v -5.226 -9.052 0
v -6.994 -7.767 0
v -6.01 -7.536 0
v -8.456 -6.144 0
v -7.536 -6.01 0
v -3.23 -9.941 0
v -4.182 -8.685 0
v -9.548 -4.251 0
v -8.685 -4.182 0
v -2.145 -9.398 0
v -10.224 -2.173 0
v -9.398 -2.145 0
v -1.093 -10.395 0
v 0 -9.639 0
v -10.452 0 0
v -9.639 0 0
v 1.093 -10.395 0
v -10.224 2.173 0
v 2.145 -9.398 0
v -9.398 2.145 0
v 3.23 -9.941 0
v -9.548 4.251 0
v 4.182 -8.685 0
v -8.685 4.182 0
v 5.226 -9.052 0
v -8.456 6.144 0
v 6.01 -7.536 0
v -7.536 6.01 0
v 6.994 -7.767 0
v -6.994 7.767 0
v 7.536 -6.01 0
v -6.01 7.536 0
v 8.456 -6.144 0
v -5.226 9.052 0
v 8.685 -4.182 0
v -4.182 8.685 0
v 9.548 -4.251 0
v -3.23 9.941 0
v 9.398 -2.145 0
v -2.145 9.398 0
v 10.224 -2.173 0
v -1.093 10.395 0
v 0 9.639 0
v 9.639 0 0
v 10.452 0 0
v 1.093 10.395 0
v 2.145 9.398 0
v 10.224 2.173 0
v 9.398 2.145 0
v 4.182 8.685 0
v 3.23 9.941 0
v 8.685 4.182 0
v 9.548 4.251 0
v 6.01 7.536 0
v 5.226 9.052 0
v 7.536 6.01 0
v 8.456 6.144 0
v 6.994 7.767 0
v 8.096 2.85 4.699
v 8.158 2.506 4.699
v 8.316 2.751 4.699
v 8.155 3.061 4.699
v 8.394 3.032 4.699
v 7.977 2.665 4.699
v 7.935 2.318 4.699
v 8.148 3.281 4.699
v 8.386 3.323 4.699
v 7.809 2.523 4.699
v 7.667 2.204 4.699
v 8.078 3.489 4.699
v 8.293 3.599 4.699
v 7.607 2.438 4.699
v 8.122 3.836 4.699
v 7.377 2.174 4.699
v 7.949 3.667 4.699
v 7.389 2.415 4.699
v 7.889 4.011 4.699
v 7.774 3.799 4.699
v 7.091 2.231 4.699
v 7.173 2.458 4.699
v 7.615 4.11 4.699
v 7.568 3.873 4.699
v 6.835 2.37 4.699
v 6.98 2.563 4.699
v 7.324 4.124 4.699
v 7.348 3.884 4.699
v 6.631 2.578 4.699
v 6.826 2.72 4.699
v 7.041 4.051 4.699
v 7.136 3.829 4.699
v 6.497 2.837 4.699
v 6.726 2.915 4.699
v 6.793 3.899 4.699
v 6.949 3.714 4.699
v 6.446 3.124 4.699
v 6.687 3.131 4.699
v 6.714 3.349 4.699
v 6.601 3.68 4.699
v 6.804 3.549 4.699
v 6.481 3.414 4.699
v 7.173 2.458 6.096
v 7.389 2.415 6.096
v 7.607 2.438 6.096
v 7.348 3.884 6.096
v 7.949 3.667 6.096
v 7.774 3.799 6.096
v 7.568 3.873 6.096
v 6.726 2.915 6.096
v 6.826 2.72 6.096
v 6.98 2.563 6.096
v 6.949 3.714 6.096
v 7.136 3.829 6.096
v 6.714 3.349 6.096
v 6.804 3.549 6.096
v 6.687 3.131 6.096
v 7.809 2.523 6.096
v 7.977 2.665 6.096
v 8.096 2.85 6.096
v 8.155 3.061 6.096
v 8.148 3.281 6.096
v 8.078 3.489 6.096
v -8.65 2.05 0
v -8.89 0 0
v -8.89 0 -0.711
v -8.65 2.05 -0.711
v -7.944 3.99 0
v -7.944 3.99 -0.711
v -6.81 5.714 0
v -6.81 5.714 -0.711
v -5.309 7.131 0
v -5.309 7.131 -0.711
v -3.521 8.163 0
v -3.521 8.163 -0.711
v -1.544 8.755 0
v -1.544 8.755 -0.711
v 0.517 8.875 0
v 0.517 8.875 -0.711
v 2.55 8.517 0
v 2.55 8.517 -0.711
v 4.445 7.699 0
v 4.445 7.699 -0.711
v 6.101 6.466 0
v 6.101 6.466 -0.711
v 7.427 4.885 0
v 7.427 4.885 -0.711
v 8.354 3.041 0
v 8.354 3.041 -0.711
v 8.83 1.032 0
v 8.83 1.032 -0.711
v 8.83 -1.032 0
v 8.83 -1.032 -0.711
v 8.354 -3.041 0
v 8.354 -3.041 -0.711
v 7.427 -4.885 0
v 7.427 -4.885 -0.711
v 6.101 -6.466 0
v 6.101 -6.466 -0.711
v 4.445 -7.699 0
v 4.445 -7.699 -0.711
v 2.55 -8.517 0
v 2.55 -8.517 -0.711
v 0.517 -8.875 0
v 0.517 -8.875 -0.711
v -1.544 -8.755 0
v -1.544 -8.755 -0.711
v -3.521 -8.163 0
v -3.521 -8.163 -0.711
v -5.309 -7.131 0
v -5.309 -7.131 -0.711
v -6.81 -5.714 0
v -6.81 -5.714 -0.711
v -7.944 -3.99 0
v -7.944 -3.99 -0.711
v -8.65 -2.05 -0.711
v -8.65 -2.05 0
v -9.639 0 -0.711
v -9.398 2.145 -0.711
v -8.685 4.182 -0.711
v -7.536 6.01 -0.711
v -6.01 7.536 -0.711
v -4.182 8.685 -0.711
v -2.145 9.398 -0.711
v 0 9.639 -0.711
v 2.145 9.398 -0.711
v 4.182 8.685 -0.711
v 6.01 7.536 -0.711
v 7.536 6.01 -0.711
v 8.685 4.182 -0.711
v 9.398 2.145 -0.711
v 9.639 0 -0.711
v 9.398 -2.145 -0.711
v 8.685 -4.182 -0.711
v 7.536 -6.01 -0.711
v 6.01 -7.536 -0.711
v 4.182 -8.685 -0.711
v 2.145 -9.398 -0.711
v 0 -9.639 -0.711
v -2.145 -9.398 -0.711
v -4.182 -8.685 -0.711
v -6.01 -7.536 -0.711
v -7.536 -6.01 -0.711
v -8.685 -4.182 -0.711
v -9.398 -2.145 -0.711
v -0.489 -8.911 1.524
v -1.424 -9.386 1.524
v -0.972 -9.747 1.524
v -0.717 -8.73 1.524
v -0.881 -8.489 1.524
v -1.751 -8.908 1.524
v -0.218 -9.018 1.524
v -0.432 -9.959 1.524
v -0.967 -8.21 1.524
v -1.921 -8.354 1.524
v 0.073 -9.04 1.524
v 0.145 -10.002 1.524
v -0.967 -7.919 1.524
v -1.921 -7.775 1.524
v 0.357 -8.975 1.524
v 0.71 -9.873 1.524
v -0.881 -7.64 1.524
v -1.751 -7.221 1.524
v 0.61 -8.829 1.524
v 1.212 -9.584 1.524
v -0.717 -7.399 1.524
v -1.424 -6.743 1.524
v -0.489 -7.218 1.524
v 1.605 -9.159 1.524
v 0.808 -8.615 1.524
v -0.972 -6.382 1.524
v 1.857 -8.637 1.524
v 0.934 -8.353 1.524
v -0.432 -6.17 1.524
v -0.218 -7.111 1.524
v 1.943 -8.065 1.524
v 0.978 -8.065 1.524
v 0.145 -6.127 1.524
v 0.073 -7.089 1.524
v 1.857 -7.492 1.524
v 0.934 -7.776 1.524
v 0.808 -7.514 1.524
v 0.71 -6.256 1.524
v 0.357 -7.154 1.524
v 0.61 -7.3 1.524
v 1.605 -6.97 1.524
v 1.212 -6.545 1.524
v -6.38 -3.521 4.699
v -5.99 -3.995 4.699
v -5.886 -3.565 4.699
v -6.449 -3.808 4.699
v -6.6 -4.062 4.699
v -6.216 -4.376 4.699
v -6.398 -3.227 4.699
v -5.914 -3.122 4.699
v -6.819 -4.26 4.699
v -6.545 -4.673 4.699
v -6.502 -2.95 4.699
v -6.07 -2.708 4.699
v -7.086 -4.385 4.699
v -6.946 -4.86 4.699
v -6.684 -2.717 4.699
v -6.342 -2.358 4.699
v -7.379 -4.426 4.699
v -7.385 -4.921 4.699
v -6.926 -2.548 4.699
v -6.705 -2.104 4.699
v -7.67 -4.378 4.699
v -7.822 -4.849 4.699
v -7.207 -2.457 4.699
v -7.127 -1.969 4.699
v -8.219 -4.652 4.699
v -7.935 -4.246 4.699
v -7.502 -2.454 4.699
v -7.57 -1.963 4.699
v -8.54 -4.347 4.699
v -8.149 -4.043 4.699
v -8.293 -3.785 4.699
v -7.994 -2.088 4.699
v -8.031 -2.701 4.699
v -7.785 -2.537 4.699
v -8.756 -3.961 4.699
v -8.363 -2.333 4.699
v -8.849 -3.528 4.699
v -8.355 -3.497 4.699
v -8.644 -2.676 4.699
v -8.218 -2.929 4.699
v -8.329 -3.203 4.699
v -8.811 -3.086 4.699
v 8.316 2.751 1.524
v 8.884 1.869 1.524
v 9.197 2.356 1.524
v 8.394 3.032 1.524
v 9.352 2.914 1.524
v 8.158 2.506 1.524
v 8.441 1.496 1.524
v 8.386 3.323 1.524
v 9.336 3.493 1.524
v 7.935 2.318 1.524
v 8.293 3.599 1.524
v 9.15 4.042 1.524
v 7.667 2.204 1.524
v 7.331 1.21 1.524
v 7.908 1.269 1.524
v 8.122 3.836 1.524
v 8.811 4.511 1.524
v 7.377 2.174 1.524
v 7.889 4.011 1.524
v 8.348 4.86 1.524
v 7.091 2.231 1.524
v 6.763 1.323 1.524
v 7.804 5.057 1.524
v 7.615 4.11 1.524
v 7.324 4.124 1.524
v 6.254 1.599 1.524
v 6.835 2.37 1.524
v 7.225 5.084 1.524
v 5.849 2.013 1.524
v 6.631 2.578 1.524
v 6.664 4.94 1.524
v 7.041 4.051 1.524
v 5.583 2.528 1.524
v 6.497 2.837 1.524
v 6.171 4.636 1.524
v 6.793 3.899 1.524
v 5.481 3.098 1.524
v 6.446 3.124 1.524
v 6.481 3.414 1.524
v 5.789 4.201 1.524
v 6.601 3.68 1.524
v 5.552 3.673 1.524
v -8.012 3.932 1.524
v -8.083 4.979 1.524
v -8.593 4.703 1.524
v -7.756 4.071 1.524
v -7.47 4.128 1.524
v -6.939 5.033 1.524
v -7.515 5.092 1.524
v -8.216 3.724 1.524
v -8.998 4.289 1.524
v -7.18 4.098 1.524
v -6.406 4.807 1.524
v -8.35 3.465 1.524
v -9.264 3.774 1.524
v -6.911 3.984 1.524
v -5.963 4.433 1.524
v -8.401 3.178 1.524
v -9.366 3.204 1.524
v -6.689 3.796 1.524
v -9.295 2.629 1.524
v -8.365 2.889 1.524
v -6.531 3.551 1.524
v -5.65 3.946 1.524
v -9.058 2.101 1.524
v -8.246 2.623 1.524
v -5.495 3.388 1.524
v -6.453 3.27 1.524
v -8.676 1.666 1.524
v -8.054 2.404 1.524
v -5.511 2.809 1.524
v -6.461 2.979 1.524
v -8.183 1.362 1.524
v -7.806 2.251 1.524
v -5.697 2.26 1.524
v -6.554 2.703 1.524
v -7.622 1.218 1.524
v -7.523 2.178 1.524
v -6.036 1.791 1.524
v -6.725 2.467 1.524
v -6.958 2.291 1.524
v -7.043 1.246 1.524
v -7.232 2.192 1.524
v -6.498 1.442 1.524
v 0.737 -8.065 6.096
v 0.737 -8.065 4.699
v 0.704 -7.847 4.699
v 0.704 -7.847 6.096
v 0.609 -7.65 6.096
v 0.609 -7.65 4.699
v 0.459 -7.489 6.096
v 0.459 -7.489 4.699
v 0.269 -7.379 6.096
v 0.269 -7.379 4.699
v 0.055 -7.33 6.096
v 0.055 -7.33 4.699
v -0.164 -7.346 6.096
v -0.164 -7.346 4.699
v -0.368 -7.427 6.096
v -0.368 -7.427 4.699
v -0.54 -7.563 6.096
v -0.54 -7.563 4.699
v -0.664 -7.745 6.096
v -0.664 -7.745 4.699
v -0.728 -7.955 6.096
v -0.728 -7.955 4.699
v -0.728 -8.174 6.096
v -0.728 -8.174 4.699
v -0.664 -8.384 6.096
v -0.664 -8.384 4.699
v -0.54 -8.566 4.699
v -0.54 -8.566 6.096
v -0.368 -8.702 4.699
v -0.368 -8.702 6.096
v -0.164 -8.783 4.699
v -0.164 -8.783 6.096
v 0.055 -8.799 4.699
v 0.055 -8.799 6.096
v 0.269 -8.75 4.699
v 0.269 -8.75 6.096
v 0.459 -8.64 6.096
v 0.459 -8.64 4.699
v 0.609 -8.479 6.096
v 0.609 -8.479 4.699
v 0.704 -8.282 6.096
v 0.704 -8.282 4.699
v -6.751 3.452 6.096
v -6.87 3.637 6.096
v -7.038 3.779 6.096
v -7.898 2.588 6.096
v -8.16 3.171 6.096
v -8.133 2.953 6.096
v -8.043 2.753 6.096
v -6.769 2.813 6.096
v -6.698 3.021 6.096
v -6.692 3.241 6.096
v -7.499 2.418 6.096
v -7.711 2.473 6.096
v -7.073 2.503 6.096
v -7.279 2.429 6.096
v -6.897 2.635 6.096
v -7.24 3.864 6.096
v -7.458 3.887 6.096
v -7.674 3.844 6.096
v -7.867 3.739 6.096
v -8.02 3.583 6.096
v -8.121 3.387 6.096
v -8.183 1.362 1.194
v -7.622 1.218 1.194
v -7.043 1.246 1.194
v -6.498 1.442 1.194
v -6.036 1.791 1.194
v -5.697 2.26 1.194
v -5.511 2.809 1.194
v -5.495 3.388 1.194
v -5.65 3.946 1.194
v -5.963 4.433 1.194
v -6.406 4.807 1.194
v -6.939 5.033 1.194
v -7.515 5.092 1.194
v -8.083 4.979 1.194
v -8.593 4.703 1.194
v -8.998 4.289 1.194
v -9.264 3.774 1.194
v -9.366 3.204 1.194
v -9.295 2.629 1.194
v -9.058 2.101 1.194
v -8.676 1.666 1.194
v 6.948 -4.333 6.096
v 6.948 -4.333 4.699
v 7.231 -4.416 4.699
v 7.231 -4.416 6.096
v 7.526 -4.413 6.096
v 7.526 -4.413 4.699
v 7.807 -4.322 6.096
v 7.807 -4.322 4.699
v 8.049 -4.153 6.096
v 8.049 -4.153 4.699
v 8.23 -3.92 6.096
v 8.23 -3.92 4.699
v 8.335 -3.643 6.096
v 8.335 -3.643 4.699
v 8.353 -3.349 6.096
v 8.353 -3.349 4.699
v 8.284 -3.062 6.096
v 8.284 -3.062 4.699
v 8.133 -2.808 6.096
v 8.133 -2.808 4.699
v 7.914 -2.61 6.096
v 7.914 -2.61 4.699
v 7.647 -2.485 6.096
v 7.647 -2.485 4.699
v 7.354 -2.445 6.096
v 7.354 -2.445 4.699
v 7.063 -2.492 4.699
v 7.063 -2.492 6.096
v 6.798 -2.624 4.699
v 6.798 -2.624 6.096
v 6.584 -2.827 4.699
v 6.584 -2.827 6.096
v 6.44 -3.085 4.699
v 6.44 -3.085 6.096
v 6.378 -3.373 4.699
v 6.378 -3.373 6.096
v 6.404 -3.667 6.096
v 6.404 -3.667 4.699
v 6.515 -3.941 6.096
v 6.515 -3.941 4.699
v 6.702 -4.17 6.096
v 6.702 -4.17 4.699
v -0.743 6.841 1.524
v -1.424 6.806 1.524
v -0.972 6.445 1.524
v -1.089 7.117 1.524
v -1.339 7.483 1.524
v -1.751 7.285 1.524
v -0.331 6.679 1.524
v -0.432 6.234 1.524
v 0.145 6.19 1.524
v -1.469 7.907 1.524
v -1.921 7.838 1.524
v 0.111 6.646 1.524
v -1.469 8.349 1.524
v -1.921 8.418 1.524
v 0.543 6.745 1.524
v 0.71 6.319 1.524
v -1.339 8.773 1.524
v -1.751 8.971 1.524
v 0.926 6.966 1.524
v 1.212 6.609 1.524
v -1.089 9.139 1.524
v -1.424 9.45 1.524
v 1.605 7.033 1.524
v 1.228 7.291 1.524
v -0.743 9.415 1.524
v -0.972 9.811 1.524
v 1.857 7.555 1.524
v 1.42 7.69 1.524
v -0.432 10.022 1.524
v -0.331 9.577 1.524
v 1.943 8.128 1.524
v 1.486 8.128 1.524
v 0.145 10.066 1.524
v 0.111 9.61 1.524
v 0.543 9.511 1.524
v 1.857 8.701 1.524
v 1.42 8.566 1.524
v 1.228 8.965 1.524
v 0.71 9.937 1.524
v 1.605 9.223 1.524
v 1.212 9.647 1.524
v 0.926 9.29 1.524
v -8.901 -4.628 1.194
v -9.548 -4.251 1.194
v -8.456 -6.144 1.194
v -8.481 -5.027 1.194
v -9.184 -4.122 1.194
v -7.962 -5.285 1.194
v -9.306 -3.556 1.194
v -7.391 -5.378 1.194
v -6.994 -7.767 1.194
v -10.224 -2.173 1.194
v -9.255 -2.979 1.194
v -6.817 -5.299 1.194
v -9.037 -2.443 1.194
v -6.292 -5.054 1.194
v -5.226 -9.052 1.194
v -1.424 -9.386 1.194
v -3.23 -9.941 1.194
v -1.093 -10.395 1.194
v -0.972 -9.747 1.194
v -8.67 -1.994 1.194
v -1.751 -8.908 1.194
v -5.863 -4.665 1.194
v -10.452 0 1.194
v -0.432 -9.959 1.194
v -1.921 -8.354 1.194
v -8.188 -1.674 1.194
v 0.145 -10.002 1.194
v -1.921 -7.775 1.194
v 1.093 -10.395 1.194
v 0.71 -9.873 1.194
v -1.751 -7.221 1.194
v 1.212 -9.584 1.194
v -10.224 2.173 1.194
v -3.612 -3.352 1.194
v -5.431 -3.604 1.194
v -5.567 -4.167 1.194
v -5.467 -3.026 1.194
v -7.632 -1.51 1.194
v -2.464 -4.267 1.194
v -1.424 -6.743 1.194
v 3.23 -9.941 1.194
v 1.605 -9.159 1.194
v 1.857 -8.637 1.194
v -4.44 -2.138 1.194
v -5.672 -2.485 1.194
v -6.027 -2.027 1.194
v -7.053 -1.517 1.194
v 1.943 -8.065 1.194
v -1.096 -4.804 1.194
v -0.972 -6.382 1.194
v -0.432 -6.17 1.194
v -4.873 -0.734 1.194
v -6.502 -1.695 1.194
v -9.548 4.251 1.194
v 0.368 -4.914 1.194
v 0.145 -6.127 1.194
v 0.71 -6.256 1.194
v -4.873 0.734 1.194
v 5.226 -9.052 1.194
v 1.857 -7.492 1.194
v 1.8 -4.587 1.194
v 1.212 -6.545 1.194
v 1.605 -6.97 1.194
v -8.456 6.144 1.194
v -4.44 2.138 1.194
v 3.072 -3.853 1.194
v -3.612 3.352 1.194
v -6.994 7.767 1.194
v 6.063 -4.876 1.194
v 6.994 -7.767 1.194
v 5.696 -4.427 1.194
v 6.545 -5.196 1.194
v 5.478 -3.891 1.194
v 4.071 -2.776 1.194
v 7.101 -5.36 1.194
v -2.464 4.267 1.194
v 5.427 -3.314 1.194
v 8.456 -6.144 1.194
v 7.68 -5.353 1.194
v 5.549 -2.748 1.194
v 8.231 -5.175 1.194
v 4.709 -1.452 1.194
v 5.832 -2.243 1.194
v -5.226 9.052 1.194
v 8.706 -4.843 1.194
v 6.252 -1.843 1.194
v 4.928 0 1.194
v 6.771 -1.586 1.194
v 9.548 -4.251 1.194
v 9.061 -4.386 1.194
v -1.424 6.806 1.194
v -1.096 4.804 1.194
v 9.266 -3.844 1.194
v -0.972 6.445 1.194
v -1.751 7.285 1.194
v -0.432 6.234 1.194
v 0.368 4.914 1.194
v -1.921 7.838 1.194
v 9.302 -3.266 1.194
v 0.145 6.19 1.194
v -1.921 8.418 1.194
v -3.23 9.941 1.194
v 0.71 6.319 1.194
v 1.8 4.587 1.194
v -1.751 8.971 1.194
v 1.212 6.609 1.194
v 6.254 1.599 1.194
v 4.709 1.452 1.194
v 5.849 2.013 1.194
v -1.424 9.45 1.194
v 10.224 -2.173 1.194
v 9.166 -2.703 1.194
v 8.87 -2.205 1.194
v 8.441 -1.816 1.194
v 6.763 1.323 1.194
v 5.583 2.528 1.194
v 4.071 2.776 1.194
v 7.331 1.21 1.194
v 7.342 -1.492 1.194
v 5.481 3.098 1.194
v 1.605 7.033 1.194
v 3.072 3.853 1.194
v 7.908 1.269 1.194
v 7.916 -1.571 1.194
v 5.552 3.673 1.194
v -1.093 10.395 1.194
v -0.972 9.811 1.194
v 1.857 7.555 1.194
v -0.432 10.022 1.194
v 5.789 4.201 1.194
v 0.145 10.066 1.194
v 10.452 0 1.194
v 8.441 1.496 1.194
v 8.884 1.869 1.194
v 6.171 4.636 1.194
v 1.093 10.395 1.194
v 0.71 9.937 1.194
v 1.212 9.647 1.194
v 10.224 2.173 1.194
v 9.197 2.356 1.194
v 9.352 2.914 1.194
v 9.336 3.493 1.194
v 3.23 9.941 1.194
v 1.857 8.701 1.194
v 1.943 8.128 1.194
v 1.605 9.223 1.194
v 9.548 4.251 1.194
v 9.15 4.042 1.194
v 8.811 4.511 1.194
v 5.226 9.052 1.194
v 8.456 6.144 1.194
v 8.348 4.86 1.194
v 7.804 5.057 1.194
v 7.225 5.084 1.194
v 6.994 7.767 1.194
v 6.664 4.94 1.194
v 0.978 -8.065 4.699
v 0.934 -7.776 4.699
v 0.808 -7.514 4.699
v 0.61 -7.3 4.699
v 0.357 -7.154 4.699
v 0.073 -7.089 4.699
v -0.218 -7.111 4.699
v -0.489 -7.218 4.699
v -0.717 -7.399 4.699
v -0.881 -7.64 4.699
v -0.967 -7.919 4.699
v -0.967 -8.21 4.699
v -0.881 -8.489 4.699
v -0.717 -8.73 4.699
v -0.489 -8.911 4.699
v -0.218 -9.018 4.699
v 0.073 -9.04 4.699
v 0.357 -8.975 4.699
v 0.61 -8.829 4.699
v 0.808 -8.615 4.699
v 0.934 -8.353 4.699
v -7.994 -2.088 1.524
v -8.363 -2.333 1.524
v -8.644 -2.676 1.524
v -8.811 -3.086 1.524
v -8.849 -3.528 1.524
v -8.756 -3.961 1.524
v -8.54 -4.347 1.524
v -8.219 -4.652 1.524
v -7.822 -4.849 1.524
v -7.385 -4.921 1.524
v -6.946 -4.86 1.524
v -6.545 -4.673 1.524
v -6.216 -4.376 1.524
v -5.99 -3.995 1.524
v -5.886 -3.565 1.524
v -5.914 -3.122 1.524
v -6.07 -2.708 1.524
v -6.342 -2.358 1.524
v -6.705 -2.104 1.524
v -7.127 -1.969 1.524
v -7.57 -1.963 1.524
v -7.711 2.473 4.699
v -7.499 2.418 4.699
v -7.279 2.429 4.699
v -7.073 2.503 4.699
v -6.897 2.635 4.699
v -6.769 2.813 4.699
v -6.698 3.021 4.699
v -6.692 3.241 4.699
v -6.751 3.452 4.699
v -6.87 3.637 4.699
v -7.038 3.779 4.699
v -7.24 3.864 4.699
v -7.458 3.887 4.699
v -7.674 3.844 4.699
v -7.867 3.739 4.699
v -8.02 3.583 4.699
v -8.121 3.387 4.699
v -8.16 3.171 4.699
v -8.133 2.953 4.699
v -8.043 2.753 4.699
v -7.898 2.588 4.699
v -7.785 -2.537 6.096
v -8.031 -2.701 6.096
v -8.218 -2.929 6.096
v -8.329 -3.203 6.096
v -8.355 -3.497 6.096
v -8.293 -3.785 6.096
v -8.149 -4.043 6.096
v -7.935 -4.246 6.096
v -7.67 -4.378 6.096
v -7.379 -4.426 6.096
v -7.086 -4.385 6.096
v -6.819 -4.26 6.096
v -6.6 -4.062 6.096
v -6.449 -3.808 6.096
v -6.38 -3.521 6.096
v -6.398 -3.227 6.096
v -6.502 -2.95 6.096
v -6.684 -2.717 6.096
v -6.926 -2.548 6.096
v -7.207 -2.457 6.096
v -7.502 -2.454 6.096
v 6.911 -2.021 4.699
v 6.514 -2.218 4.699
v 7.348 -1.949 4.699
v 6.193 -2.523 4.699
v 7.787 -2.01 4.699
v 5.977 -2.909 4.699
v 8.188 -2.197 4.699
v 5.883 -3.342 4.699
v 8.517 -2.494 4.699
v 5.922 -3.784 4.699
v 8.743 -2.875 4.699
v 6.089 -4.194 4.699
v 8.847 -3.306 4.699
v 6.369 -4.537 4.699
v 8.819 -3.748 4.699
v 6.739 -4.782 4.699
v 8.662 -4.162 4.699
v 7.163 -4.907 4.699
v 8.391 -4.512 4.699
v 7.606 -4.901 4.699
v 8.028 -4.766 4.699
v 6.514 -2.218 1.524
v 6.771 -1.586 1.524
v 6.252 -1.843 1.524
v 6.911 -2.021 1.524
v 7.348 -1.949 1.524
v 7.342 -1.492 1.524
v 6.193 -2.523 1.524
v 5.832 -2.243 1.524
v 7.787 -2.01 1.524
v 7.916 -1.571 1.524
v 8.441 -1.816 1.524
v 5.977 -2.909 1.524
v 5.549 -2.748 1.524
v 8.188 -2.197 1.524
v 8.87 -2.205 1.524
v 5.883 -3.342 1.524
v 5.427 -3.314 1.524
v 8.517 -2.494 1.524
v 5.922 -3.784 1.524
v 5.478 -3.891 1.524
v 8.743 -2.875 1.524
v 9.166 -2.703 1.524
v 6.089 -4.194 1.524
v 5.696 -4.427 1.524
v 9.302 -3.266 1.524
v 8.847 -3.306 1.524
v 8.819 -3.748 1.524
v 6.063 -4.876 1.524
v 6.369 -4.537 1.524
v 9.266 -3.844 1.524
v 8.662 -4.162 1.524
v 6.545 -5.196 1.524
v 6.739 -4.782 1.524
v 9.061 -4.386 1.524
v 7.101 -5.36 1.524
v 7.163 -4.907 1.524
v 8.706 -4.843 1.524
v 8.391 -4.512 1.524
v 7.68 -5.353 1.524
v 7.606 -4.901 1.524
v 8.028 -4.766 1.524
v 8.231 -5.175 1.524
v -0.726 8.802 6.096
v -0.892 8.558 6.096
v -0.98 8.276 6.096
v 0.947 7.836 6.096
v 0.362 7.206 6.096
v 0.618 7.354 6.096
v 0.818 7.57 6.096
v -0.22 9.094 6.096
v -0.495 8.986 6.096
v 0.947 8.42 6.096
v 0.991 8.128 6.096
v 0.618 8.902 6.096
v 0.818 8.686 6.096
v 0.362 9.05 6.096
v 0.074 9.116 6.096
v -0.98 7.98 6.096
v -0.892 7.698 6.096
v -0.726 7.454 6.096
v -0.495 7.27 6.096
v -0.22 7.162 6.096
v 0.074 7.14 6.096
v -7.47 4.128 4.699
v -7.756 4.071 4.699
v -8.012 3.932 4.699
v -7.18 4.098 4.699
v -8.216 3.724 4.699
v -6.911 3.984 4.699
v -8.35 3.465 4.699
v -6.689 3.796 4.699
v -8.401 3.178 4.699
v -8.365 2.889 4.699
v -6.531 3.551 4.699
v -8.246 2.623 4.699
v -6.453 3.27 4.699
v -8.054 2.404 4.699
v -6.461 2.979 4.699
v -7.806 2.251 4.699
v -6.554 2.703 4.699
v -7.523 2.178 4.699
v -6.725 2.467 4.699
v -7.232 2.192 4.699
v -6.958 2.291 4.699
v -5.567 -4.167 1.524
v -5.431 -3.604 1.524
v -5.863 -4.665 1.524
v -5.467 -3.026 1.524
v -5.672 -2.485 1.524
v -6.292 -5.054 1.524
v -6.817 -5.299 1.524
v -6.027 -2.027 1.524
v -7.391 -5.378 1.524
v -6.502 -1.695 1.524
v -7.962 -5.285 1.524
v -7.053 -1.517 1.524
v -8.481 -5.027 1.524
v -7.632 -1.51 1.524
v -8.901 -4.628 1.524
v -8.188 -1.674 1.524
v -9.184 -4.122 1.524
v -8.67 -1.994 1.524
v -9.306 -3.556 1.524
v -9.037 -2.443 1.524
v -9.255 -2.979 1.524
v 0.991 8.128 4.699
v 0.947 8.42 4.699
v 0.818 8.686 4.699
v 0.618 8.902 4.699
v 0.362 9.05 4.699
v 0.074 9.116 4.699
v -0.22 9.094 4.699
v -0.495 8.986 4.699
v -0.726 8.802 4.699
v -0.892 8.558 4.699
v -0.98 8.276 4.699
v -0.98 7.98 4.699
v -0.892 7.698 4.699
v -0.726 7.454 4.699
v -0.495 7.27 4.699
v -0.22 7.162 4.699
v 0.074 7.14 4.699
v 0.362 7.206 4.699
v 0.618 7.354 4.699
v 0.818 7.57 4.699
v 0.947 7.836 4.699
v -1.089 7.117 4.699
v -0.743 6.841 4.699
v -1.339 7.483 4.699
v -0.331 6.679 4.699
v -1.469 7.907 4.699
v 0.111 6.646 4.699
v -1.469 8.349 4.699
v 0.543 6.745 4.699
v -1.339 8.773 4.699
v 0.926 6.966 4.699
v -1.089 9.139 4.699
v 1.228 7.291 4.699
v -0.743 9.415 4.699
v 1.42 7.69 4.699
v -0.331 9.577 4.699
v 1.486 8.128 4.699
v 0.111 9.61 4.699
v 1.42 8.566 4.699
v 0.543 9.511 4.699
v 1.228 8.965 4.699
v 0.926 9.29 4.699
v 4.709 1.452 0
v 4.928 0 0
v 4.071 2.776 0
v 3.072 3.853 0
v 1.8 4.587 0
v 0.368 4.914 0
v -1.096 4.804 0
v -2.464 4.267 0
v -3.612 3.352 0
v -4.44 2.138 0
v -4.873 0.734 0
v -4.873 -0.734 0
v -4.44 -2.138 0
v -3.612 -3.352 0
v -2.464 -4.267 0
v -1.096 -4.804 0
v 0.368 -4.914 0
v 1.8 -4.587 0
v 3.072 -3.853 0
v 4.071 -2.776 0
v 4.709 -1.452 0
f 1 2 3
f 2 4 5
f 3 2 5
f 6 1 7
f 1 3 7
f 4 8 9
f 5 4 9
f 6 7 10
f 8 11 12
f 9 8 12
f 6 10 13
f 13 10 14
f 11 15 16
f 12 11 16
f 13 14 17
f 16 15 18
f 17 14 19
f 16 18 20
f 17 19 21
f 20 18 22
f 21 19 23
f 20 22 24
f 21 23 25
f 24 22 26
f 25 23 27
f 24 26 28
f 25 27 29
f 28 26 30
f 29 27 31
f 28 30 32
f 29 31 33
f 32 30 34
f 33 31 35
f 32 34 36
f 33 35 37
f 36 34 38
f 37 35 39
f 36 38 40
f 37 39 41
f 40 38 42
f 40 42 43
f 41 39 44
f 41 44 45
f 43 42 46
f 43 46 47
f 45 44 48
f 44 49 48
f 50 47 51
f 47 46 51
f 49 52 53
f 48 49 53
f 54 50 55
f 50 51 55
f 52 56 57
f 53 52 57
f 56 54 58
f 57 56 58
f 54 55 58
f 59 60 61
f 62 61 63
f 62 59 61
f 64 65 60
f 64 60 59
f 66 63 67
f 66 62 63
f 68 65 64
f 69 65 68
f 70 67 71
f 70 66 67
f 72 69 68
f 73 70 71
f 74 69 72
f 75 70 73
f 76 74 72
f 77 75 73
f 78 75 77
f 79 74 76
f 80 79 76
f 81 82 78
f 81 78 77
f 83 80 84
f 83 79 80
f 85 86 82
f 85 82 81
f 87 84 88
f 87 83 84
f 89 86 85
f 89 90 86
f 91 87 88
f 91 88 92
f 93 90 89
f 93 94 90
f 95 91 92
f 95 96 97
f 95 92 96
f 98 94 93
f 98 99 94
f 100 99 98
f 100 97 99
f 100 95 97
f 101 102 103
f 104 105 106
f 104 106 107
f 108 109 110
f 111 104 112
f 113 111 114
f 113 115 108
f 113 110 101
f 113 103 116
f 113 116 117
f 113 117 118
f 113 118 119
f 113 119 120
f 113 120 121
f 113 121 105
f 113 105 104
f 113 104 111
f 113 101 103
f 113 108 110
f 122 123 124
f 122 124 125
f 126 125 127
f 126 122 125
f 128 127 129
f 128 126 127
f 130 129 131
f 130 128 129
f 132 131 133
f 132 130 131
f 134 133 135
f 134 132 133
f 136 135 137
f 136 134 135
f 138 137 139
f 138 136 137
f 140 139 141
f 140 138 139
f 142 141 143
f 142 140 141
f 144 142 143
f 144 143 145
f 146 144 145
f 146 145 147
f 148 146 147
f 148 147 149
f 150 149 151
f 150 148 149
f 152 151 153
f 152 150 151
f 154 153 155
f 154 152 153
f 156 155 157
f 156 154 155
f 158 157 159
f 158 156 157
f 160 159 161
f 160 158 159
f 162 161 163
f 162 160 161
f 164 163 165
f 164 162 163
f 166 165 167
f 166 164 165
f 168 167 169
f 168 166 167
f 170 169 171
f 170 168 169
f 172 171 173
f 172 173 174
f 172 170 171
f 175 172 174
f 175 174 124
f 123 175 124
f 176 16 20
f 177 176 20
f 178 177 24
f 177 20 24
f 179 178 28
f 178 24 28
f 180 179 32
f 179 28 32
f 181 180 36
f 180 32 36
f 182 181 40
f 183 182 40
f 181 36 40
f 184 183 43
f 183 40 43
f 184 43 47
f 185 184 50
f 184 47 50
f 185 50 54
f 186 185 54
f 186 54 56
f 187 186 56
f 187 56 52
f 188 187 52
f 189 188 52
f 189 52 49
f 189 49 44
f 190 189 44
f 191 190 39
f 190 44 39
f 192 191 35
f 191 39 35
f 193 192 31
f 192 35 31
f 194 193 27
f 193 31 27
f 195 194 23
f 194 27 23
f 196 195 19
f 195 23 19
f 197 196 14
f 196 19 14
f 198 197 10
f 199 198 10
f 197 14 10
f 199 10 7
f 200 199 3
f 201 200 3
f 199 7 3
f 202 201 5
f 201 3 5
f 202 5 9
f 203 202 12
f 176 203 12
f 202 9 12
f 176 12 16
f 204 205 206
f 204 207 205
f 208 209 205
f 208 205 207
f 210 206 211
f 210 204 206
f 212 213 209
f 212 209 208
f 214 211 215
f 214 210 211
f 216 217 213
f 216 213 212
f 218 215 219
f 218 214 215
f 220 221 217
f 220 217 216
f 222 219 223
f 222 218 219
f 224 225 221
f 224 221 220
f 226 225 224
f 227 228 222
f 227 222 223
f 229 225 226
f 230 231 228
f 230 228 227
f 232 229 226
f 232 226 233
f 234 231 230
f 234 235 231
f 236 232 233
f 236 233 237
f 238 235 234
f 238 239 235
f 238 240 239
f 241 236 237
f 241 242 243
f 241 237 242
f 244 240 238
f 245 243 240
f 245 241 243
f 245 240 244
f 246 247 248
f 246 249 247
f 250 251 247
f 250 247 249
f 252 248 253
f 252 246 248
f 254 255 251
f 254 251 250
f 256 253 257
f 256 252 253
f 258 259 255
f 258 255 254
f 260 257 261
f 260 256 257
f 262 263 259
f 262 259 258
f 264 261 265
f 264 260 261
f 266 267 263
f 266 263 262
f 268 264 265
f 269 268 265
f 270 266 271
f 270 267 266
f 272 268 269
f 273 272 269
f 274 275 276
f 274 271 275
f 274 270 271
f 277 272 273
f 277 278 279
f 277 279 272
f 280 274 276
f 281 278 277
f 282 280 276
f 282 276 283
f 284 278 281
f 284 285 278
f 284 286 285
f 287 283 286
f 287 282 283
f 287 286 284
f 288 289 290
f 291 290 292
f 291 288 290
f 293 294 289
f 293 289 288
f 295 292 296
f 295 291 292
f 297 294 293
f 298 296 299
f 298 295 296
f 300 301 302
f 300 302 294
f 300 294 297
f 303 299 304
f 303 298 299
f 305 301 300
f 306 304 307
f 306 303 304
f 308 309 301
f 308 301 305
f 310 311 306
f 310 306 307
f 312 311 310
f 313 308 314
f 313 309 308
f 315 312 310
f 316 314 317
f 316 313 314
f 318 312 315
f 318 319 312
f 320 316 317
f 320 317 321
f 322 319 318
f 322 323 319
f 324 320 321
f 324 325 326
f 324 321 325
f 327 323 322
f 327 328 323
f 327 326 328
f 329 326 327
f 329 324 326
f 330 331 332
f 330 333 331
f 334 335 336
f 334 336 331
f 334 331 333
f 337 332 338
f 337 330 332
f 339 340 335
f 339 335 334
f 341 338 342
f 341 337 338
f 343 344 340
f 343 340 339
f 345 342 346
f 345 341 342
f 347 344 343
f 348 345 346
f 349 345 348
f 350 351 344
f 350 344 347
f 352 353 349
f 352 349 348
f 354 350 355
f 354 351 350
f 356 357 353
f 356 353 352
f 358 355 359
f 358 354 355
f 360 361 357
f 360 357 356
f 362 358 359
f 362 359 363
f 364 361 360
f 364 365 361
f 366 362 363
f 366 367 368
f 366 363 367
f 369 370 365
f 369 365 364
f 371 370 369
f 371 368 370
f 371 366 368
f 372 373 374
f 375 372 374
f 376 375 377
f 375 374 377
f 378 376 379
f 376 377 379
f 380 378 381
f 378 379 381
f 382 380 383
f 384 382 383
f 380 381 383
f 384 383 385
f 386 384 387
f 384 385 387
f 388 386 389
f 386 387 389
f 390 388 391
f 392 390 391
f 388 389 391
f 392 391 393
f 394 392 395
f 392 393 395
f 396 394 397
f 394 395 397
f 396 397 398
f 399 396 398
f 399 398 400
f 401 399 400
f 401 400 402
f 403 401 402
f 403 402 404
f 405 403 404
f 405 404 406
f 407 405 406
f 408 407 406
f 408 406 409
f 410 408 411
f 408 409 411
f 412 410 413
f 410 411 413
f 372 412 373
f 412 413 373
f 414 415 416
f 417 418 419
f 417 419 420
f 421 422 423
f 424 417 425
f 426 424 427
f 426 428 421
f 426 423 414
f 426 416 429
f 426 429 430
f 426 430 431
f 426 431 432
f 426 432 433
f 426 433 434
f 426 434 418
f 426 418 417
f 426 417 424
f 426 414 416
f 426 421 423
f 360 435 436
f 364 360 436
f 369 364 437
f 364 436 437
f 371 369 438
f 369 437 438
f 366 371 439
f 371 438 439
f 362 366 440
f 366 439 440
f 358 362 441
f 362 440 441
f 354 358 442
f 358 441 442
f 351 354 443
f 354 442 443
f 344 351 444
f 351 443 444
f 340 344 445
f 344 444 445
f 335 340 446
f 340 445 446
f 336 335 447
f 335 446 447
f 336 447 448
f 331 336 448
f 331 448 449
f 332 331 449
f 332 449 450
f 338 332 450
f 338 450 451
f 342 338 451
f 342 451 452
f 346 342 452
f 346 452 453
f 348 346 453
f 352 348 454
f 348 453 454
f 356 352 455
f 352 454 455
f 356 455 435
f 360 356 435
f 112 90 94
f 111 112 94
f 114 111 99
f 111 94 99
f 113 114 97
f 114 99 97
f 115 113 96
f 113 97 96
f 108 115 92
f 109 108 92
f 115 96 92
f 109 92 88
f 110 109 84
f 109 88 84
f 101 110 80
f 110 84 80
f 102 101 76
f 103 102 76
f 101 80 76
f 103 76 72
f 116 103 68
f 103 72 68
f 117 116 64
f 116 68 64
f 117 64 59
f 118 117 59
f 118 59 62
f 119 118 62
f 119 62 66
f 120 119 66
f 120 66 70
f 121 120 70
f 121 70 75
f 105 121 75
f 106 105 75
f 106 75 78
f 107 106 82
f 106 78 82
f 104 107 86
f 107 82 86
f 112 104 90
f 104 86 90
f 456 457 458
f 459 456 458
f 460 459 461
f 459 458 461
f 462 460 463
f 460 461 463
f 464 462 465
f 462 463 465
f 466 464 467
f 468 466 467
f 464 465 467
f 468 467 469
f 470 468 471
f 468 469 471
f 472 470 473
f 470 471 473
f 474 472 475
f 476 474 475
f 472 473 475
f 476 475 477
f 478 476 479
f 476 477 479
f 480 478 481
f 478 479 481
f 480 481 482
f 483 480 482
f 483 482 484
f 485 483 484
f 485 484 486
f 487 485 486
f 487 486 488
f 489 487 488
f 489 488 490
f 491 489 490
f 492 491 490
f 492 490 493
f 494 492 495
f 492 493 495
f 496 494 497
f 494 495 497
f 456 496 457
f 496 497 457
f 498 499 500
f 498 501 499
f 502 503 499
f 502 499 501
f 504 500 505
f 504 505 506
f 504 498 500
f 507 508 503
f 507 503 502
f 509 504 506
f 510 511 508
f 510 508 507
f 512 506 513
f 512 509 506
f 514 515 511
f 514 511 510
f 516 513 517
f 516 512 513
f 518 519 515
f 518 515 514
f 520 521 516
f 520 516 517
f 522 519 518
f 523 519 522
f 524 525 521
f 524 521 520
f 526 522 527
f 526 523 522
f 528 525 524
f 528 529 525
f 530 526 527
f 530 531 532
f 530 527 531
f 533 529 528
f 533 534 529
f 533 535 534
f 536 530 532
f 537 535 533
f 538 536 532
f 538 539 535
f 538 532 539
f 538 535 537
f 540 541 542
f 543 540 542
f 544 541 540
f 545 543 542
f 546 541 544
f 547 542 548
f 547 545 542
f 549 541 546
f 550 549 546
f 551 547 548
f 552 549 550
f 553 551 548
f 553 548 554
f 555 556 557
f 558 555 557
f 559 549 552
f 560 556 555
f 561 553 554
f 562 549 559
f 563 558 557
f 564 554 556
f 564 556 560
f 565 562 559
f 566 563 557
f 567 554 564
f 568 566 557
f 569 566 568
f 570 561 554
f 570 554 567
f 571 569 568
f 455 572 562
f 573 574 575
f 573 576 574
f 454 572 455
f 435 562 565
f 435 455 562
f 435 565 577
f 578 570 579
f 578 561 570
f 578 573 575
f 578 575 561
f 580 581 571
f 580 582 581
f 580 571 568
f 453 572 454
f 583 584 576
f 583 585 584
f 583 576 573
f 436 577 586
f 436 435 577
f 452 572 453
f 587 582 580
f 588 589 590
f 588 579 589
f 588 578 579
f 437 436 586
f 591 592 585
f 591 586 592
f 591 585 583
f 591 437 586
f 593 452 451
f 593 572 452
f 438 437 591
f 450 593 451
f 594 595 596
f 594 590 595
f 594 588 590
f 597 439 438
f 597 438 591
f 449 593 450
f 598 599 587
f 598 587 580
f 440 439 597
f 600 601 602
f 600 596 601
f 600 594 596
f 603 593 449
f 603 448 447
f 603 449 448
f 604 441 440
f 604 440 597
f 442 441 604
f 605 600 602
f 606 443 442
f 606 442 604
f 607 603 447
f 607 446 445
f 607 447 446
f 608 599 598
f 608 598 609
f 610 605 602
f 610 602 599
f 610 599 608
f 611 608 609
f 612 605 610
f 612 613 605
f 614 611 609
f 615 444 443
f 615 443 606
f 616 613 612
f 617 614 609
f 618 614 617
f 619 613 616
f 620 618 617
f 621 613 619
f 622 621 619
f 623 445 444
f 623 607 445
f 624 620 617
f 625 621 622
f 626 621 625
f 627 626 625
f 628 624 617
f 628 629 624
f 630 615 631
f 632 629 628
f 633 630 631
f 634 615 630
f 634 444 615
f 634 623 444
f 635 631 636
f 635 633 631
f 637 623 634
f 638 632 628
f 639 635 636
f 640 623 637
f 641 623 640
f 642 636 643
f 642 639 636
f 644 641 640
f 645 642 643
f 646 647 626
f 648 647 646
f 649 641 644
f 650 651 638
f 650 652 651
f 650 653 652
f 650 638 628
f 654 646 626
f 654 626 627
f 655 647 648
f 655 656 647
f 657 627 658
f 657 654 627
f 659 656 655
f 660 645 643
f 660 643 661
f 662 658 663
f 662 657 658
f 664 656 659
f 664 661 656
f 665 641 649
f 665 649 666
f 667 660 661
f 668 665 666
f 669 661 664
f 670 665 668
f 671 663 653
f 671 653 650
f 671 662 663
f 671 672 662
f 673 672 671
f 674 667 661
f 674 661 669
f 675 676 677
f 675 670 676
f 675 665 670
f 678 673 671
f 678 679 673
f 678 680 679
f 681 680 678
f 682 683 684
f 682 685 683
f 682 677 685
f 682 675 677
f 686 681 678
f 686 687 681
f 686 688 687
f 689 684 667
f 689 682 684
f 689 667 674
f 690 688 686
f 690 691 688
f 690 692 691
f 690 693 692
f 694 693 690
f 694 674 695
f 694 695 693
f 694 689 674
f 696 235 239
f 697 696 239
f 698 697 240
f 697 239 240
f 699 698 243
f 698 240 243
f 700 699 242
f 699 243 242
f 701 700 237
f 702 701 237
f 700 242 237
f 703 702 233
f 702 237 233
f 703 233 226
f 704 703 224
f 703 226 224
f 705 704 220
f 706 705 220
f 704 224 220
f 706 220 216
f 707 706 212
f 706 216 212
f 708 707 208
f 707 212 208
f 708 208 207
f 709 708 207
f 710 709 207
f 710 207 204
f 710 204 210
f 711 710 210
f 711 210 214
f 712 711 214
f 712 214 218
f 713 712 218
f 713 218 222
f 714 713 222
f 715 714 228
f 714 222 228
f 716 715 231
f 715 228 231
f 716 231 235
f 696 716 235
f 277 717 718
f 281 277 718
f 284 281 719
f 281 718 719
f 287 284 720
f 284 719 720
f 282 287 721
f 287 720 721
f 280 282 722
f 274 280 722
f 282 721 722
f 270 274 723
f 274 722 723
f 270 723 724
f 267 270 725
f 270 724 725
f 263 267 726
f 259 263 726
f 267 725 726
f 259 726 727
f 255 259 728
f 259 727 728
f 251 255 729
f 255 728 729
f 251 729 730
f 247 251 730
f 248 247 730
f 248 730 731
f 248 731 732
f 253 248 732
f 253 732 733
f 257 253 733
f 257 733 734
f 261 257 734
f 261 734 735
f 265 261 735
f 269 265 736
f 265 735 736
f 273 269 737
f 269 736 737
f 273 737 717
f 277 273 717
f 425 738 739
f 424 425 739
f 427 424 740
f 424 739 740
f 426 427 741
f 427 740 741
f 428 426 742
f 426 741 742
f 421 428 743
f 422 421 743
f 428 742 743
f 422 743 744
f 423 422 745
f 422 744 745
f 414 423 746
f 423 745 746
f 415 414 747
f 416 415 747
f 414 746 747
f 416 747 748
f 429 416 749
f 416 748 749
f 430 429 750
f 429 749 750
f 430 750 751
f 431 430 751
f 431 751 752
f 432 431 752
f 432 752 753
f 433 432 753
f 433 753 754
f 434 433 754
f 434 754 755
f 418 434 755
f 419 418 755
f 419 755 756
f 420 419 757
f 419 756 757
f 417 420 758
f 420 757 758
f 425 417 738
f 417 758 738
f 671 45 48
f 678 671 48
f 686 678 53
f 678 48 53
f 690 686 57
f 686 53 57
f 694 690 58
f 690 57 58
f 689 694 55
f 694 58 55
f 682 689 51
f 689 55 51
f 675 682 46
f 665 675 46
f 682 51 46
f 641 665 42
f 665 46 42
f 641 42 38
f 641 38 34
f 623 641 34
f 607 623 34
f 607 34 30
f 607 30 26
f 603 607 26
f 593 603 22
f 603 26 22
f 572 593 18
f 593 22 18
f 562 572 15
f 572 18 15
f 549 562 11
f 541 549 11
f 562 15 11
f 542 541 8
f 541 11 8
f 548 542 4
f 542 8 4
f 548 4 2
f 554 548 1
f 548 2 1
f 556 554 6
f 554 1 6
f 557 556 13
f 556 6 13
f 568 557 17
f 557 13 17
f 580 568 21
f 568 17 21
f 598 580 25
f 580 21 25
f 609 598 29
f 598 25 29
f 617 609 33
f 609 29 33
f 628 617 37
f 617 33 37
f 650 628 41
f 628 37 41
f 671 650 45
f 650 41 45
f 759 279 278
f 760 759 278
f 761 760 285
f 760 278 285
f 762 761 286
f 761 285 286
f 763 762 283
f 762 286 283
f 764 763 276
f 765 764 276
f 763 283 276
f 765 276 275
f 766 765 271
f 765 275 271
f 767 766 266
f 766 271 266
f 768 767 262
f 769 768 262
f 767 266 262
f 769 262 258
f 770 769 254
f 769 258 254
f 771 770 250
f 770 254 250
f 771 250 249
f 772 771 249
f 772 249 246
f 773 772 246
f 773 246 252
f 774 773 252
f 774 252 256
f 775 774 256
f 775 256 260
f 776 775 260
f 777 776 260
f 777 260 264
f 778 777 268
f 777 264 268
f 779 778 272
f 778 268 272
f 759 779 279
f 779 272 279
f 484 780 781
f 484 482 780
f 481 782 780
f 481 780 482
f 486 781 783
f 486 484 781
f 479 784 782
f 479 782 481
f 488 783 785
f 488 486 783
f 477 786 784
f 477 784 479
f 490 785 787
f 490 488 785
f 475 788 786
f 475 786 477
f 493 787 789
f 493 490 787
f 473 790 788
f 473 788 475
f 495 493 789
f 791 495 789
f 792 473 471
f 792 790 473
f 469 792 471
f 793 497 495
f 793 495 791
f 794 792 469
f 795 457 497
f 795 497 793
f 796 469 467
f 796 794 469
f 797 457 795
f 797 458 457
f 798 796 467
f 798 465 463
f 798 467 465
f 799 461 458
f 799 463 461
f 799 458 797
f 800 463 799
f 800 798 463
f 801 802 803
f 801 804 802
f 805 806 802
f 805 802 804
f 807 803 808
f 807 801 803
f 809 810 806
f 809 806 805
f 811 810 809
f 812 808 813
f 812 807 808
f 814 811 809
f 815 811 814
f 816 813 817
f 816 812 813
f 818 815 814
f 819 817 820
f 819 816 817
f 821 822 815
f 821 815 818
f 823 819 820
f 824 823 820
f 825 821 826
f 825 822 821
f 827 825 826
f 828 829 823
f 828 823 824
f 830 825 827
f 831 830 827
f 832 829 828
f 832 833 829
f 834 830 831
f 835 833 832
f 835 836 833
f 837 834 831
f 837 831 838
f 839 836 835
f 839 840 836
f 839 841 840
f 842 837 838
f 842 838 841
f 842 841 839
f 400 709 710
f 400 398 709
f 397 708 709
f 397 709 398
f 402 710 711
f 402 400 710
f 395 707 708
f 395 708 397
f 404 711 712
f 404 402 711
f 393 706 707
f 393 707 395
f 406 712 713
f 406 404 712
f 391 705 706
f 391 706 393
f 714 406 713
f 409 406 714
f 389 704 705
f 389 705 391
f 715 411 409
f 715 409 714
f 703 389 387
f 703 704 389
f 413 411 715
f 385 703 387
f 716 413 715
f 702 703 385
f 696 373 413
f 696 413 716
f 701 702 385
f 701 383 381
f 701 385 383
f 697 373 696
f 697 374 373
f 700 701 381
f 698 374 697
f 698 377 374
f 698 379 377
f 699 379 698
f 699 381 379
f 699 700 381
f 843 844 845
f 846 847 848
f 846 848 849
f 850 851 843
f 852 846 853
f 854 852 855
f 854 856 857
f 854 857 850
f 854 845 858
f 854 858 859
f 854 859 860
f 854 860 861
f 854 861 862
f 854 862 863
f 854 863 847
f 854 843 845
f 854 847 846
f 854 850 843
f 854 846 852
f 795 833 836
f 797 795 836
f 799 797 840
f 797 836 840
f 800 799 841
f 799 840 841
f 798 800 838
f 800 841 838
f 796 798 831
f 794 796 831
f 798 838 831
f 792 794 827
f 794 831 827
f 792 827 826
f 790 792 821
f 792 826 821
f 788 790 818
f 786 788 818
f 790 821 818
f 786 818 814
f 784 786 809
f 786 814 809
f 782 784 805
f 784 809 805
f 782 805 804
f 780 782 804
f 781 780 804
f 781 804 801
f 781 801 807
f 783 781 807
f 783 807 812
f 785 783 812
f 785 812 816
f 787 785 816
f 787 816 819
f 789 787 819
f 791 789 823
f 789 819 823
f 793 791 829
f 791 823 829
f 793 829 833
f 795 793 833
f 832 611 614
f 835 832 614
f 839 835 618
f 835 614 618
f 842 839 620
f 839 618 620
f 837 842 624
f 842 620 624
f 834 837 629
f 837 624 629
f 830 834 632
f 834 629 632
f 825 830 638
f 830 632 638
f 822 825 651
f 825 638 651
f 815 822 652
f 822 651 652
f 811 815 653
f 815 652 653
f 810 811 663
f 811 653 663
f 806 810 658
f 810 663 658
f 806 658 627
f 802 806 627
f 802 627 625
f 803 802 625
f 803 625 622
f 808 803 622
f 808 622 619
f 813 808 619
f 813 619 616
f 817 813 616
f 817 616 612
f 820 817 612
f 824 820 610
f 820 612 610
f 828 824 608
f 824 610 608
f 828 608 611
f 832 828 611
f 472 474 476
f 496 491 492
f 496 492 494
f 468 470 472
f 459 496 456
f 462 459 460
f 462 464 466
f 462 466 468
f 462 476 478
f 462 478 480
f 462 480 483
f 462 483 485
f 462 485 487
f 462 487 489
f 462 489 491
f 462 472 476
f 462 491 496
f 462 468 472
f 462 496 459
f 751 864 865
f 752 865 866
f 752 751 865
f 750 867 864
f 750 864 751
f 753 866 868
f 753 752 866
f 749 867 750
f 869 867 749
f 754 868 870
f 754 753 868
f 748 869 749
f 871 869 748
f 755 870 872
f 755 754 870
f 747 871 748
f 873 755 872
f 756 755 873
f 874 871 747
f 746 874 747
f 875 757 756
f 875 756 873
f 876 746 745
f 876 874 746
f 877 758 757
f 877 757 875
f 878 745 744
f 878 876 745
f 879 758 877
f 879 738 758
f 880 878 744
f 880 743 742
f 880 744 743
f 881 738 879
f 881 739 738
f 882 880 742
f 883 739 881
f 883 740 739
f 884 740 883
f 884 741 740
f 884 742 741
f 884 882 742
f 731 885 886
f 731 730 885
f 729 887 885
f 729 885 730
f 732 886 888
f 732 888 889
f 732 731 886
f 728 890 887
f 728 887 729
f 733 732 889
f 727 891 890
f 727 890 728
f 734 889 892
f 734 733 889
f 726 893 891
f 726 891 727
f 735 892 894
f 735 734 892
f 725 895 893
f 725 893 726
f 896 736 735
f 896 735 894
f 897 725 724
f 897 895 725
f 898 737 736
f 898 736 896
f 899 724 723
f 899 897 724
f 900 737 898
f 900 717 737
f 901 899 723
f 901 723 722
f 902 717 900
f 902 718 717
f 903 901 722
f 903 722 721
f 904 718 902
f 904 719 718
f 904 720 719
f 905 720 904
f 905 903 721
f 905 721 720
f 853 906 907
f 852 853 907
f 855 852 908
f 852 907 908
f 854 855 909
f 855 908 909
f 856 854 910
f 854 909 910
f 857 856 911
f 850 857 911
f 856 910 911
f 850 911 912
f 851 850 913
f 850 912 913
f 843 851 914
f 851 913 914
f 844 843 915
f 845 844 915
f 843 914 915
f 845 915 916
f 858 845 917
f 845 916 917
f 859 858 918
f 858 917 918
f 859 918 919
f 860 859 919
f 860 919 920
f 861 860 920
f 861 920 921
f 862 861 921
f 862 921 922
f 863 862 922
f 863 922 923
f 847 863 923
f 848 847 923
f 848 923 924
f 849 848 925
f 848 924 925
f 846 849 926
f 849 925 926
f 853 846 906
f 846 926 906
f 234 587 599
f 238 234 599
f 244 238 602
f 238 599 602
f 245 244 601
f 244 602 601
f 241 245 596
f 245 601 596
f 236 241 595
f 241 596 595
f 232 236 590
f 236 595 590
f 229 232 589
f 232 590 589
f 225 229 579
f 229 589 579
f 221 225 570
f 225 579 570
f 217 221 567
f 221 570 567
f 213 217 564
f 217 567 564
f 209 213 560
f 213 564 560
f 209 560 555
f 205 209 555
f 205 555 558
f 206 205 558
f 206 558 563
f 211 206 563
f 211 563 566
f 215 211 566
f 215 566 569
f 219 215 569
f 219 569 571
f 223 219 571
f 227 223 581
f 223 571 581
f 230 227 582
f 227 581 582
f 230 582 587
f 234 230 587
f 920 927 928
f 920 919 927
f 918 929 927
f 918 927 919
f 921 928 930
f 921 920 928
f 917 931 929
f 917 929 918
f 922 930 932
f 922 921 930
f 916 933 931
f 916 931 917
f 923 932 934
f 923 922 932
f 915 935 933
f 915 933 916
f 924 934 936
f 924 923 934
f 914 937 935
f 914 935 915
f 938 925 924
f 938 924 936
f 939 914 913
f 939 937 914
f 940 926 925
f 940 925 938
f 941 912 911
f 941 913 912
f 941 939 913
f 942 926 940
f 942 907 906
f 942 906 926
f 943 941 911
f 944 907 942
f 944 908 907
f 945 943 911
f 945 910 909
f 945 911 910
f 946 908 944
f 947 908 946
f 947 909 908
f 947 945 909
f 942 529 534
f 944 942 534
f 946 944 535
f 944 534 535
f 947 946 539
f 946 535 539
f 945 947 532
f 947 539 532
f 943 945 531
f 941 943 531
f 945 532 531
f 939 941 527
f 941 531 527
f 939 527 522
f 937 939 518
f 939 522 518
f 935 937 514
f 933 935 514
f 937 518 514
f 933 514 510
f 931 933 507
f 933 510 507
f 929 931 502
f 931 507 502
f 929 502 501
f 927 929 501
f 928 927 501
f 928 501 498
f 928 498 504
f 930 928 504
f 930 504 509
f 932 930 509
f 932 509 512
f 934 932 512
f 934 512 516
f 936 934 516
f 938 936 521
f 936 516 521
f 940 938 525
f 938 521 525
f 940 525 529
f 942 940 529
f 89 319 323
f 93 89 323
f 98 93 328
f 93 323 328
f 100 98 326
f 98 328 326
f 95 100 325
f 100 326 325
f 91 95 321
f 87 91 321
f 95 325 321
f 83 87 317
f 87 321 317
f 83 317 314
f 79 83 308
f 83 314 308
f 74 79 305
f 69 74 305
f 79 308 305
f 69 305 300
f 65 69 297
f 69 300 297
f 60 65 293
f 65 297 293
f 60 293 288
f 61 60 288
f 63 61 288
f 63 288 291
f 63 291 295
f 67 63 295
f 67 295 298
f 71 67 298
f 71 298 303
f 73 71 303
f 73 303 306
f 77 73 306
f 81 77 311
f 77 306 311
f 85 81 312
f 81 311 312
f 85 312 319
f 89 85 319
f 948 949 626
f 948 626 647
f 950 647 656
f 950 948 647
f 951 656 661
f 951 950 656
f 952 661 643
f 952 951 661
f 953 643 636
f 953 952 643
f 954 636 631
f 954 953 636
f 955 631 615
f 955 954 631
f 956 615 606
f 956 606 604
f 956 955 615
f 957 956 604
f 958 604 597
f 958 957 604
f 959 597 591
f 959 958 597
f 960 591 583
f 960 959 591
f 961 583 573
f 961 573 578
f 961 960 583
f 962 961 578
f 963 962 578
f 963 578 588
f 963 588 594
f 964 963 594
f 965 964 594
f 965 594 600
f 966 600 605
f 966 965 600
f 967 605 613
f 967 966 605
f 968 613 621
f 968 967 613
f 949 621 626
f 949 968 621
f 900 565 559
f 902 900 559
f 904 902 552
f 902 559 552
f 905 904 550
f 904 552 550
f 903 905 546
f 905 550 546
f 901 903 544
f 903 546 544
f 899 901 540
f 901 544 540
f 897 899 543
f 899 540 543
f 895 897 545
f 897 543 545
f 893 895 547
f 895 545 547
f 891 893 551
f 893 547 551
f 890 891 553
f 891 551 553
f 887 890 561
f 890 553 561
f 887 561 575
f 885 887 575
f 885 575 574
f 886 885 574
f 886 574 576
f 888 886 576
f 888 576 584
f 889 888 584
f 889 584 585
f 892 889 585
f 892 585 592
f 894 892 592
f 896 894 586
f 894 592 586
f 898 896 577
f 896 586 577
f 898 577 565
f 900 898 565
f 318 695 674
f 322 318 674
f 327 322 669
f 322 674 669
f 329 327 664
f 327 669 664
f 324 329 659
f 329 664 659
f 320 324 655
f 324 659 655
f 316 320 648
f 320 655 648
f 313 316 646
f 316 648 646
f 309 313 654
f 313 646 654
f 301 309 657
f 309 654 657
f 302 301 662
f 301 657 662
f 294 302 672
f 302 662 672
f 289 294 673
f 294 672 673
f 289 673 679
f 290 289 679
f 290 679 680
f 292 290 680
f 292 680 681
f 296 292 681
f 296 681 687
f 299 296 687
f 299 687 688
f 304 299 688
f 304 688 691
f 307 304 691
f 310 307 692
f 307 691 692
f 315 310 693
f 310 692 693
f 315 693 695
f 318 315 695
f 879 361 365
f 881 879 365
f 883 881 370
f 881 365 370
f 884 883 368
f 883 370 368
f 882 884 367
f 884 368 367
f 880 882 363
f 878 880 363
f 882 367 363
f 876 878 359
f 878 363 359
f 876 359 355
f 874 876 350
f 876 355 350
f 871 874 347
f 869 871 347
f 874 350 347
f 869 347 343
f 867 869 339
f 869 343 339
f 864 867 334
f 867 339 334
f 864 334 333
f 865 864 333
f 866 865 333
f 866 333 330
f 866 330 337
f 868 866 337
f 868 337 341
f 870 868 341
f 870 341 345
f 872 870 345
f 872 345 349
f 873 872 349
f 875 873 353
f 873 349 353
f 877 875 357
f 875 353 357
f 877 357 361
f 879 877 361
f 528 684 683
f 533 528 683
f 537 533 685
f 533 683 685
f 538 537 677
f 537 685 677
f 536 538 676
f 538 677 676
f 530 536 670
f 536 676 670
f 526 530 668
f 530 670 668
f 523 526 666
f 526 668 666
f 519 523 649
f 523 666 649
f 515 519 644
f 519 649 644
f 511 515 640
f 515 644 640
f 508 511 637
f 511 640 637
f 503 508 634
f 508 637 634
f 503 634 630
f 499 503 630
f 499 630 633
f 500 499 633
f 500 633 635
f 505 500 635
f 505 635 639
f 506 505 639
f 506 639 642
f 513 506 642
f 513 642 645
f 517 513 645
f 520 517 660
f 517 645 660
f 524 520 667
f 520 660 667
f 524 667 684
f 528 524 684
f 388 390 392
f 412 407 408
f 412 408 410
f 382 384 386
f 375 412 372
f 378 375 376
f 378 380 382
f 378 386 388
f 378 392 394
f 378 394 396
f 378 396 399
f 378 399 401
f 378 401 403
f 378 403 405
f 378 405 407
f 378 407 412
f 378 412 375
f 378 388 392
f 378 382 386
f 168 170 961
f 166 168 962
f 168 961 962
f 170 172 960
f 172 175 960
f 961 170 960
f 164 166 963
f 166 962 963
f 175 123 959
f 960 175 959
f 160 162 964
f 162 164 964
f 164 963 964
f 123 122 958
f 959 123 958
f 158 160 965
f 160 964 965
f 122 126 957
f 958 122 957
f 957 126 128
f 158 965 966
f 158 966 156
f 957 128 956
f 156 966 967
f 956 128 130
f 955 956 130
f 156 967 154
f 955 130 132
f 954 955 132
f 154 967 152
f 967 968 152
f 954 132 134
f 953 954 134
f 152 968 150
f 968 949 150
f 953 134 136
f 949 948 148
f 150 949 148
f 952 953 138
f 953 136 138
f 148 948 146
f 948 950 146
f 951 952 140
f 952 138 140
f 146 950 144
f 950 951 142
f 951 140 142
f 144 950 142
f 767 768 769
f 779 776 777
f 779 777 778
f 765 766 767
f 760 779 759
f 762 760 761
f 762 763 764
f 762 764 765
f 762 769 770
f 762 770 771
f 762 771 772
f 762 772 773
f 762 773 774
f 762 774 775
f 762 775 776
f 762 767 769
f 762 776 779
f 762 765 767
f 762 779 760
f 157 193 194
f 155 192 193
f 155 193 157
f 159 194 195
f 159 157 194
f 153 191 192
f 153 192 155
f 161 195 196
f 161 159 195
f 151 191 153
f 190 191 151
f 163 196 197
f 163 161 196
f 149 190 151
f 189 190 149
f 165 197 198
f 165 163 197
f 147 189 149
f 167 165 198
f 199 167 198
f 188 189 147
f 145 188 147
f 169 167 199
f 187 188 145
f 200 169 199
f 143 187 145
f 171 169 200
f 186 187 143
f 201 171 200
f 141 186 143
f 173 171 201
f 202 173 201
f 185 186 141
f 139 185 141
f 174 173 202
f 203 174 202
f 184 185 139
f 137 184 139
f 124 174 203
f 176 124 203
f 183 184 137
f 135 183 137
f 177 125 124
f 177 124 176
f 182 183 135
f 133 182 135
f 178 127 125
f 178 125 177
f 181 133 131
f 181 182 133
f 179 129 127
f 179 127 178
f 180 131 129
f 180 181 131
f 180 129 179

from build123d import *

# Parameters (mm, degrees)
SKETCH1_R                        = 10.4521
SKETCH1_R_2                      = 4.9276
BASE_DEPTH                       = 1.1938
SKETCH2_R                        = 9.6393
SKETCH2_R_2                      = 8.89
TRACK_DEPTH                      = 0.7112
SKETCH3_R                        = 1.9431
PLATFORM_A1_DEPTH                = 0.3302
SKETCH4_R                        = 1.4859
PLATFORM_A2_DEPTH                = 3.175
SKETCH5_R                        = 0.9906
PLATFORM_A3_DEPTH                = 1.397
CCW_PATTERN_FOR_PLATFORM_A_COUNT = 2
CCW_PATTERN_FOR_PLATFORM_A_ANGLE = 115
CW_PATTERN_FOR_PLATFORM_A_COUNT  = 2
CW_PATTERN_FOR_PLATFORM_A_ANGLE  = 115
SKETCH6_R                        = 1.9431
PLATFORM_B1_DEPTH                = 0.3302
SKETCH7_R                        = 0.9779
PLATFORM_B2_DEPTH                = 3.175
SKETCH8_R                        = 0.7366
PLATFORM_B3_DEPTH                = 1.397
CCW_PATTERN_FOR_PLATFORM_B_COUNT = 2
CCW_PATTERN_FOR_PLATFORM_B_ANGLE = 113
CW_PATTERN_FOR_PLATFORM_B_COUNT  = 2
CW_PATTERN_FOR_PLATFORM_B_ANGLE  = 113


with BuildPart() as part:
    # Sketch1 → Base (new body)
    with BuildSketch(Plane.XY):
        Circle(SKETCH1_R)
        Circle(SKETCH1_R_2, mode=Mode.SUBTRACT)
    extrude(amount=BASE_DEPTH)

    # Sketch2 → Track (add)
    with BuildSketch(Plane(origin=(0, 0, 0), x_dir=(-1, 0, 0), z_dir=(0, 0, -1))):
        Circle(SKETCH2_R)
        Circle(SKETCH2_R_2, mode=Mode.SUBTRACT)
    extrude(amount=TRACK_DEPTH)

    # Sketch3 → Platform A1 (add)
    with BuildSketch(Plane.XY.offset(1.1938)):
        with Locations((0, 8.128)):
            Circle(SKETCH3_R)
    platform_a1 = extrude(amount=PLATFORM_A1_DEPTH)

    # Sketch4 → Platform A2 (add)
    with BuildSketch(Plane.XY.offset(1.524)):
        with Locations((0, 8.128)):
            Circle(SKETCH4_R)
    platform_a2 = extrude(amount=PLATFORM_A2_DEPTH)

    # Sketch5 → Platform A3 (add)
    with BuildSketch(Plane.XY.offset(4.699)):
        with Locations((0, 8.128)):
            Circle(SKETCH5_R)
    platform_a3 = extrude(amount=PLATFORM_A3_DEPTH)

    # CCW pattern for platform A: Platform A1, Platform A2, Platform A3 ×2 about axis
    ccw_pattern_for_platform_a_axis = Axis((0, 0, 1.1938), (0, 0, 1))
    for i in range(1, CCW_PATTERN_FOR_PLATFORM_A_COUNT):
        add(platform_a1.rotate(ccw_pattern_for_platform_a_axis, i * CCW_PATTERN_FOR_PLATFORM_A_ANGLE / (CCW_PATTERN_FOR_PLATFORM_A_COUNT - 1)))
        add(platform_a2.rotate(ccw_pattern_for_platform_a_axis, i * CCW_PATTERN_FOR_PLATFORM_A_ANGLE / (CCW_PATTERN_FOR_PLATFORM_A_COUNT - 1)))
        add(platform_a3.rotate(ccw_pattern_for_platform_a_axis, i * CCW_PATTERN_FOR_PLATFORM_A_ANGLE / (CCW_PATTERN_FOR_PLATFORM_A_COUNT - 1)))

    # CW pattern for platform A: Platform A1, Platform A2, Platform A3 ×2 about axis
    cw_pattern_for_platform_a_axis = Axis((0, 0, 1.1938), (0, 0, -1))
    for i in range(1, CW_PATTERN_FOR_PLATFORM_A_COUNT):
        add(platform_a1.rotate(cw_pattern_for_platform_a_axis, i * CW_PATTERN_FOR_PLATFORM_A_ANGLE / (CW_PATTERN_FOR_PLATFORM_A_COUNT - 1)))
        add(platform_a2.rotate(cw_pattern_for_platform_a_axis, i * CW_PATTERN_FOR_PLATFORM_A_ANGLE / (CW_PATTERN_FOR_PLATFORM_A_COUNT - 1)))
        add(platform_a3.rotate(cw_pattern_for_platform_a_axis, i * CW_PATTERN_FOR_PLATFORM_A_ANGLE / (CW_PATTERN_FOR_PLATFORM_A_COUNT - 1)))

    # Sketch6 → Platform B1 (add)
    with BuildSketch(Plane.XY.offset(1.1938)):
        with Locations((0, -8.0645)):
            Circle(SKETCH6_R)
    platform_b1 = extrude(amount=PLATFORM_B1_DEPTH)

    # Sketch7 → Platform B2 (add)
    with BuildSketch(Plane.XY.offset(1.524)):
        with Locations((0, -8.0645)):
            Circle(SKETCH7_R)
    platform_b2 = extrude(amount=PLATFORM_B2_DEPTH)

    # Sketch8 → Platform B3 (add)
    with BuildSketch(Plane.XY.offset(4.699)):
        with Locations((0, -8.0645)):
            Circle(SKETCH8_R)
    platform_b3 = extrude(amount=PLATFORM_B3_DEPTH)

    # CCW pattern for platform B: Platform B1, Platform B2, Platform B3 ×2 about axis
    ccw_pattern_for_platform_b_axis = Axis((0, 0, 1.1938), (0, 0, 1))
    for i in range(1, CCW_PATTERN_FOR_PLATFORM_B_COUNT):
        add(platform_b1.rotate(ccw_pattern_for_platform_b_axis, i * CCW_PATTERN_FOR_PLATFORM_B_ANGLE / (CCW_PATTERN_FOR_PLATFORM_B_COUNT - 1)))
        add(platform_b2.rotate(ccw_pattern_for_platform_b_axis, i * CCW_PATTERN_FOR_PLATFORM_B_ANGLE / (CCW_PATTERN_FOR_PLATFORM_B_COUNT - 1)))
        add(platform_b3.rotate(ccw_pattern_for_platform_b_axis, i * CCW_PATTERN_FOR_PLATFORM_B_ANGLE / (CCW_PATTERN_FOR_PLATFORM_B_COUNT - 1)))

    # CW pattern for platform B: Platform B1, Platform B2, Platform B3 ×2 about axis
    cw_pattern_for_platform_b_axis = Axis((0, 0, 1.1938), (0, 0, -1))
    for i in range(1, CW_PATTERN_FOR_PLATFORM_B_COUNT):
        add(platform_b1.rotate(cw_pattern_for_platform_b_axis, i * CW_PATTERN_FOR_PLATFORM_B_ANGLE / (CW_PATTERN_FOR_PLATFORM_B_COUNT - 1)))
        add(platform_b2.rotate(cw_pattern_for_platform_b_axis, i * CW_PATTERN_FOR_PLATFORM_B_ANGLE / (CW_PATTERN_FOR_PLATFORM_B_COUNT - 1)))
        add(platform_b3.rotate(cw_pattern_for_platform_b_axis, i * CW_PATTERN_FOR_PLATFORM_B_ANGLE / (CW_PATTERN_FOR_PLATFORM_B_COUNT - 1)))


solid = part.part
